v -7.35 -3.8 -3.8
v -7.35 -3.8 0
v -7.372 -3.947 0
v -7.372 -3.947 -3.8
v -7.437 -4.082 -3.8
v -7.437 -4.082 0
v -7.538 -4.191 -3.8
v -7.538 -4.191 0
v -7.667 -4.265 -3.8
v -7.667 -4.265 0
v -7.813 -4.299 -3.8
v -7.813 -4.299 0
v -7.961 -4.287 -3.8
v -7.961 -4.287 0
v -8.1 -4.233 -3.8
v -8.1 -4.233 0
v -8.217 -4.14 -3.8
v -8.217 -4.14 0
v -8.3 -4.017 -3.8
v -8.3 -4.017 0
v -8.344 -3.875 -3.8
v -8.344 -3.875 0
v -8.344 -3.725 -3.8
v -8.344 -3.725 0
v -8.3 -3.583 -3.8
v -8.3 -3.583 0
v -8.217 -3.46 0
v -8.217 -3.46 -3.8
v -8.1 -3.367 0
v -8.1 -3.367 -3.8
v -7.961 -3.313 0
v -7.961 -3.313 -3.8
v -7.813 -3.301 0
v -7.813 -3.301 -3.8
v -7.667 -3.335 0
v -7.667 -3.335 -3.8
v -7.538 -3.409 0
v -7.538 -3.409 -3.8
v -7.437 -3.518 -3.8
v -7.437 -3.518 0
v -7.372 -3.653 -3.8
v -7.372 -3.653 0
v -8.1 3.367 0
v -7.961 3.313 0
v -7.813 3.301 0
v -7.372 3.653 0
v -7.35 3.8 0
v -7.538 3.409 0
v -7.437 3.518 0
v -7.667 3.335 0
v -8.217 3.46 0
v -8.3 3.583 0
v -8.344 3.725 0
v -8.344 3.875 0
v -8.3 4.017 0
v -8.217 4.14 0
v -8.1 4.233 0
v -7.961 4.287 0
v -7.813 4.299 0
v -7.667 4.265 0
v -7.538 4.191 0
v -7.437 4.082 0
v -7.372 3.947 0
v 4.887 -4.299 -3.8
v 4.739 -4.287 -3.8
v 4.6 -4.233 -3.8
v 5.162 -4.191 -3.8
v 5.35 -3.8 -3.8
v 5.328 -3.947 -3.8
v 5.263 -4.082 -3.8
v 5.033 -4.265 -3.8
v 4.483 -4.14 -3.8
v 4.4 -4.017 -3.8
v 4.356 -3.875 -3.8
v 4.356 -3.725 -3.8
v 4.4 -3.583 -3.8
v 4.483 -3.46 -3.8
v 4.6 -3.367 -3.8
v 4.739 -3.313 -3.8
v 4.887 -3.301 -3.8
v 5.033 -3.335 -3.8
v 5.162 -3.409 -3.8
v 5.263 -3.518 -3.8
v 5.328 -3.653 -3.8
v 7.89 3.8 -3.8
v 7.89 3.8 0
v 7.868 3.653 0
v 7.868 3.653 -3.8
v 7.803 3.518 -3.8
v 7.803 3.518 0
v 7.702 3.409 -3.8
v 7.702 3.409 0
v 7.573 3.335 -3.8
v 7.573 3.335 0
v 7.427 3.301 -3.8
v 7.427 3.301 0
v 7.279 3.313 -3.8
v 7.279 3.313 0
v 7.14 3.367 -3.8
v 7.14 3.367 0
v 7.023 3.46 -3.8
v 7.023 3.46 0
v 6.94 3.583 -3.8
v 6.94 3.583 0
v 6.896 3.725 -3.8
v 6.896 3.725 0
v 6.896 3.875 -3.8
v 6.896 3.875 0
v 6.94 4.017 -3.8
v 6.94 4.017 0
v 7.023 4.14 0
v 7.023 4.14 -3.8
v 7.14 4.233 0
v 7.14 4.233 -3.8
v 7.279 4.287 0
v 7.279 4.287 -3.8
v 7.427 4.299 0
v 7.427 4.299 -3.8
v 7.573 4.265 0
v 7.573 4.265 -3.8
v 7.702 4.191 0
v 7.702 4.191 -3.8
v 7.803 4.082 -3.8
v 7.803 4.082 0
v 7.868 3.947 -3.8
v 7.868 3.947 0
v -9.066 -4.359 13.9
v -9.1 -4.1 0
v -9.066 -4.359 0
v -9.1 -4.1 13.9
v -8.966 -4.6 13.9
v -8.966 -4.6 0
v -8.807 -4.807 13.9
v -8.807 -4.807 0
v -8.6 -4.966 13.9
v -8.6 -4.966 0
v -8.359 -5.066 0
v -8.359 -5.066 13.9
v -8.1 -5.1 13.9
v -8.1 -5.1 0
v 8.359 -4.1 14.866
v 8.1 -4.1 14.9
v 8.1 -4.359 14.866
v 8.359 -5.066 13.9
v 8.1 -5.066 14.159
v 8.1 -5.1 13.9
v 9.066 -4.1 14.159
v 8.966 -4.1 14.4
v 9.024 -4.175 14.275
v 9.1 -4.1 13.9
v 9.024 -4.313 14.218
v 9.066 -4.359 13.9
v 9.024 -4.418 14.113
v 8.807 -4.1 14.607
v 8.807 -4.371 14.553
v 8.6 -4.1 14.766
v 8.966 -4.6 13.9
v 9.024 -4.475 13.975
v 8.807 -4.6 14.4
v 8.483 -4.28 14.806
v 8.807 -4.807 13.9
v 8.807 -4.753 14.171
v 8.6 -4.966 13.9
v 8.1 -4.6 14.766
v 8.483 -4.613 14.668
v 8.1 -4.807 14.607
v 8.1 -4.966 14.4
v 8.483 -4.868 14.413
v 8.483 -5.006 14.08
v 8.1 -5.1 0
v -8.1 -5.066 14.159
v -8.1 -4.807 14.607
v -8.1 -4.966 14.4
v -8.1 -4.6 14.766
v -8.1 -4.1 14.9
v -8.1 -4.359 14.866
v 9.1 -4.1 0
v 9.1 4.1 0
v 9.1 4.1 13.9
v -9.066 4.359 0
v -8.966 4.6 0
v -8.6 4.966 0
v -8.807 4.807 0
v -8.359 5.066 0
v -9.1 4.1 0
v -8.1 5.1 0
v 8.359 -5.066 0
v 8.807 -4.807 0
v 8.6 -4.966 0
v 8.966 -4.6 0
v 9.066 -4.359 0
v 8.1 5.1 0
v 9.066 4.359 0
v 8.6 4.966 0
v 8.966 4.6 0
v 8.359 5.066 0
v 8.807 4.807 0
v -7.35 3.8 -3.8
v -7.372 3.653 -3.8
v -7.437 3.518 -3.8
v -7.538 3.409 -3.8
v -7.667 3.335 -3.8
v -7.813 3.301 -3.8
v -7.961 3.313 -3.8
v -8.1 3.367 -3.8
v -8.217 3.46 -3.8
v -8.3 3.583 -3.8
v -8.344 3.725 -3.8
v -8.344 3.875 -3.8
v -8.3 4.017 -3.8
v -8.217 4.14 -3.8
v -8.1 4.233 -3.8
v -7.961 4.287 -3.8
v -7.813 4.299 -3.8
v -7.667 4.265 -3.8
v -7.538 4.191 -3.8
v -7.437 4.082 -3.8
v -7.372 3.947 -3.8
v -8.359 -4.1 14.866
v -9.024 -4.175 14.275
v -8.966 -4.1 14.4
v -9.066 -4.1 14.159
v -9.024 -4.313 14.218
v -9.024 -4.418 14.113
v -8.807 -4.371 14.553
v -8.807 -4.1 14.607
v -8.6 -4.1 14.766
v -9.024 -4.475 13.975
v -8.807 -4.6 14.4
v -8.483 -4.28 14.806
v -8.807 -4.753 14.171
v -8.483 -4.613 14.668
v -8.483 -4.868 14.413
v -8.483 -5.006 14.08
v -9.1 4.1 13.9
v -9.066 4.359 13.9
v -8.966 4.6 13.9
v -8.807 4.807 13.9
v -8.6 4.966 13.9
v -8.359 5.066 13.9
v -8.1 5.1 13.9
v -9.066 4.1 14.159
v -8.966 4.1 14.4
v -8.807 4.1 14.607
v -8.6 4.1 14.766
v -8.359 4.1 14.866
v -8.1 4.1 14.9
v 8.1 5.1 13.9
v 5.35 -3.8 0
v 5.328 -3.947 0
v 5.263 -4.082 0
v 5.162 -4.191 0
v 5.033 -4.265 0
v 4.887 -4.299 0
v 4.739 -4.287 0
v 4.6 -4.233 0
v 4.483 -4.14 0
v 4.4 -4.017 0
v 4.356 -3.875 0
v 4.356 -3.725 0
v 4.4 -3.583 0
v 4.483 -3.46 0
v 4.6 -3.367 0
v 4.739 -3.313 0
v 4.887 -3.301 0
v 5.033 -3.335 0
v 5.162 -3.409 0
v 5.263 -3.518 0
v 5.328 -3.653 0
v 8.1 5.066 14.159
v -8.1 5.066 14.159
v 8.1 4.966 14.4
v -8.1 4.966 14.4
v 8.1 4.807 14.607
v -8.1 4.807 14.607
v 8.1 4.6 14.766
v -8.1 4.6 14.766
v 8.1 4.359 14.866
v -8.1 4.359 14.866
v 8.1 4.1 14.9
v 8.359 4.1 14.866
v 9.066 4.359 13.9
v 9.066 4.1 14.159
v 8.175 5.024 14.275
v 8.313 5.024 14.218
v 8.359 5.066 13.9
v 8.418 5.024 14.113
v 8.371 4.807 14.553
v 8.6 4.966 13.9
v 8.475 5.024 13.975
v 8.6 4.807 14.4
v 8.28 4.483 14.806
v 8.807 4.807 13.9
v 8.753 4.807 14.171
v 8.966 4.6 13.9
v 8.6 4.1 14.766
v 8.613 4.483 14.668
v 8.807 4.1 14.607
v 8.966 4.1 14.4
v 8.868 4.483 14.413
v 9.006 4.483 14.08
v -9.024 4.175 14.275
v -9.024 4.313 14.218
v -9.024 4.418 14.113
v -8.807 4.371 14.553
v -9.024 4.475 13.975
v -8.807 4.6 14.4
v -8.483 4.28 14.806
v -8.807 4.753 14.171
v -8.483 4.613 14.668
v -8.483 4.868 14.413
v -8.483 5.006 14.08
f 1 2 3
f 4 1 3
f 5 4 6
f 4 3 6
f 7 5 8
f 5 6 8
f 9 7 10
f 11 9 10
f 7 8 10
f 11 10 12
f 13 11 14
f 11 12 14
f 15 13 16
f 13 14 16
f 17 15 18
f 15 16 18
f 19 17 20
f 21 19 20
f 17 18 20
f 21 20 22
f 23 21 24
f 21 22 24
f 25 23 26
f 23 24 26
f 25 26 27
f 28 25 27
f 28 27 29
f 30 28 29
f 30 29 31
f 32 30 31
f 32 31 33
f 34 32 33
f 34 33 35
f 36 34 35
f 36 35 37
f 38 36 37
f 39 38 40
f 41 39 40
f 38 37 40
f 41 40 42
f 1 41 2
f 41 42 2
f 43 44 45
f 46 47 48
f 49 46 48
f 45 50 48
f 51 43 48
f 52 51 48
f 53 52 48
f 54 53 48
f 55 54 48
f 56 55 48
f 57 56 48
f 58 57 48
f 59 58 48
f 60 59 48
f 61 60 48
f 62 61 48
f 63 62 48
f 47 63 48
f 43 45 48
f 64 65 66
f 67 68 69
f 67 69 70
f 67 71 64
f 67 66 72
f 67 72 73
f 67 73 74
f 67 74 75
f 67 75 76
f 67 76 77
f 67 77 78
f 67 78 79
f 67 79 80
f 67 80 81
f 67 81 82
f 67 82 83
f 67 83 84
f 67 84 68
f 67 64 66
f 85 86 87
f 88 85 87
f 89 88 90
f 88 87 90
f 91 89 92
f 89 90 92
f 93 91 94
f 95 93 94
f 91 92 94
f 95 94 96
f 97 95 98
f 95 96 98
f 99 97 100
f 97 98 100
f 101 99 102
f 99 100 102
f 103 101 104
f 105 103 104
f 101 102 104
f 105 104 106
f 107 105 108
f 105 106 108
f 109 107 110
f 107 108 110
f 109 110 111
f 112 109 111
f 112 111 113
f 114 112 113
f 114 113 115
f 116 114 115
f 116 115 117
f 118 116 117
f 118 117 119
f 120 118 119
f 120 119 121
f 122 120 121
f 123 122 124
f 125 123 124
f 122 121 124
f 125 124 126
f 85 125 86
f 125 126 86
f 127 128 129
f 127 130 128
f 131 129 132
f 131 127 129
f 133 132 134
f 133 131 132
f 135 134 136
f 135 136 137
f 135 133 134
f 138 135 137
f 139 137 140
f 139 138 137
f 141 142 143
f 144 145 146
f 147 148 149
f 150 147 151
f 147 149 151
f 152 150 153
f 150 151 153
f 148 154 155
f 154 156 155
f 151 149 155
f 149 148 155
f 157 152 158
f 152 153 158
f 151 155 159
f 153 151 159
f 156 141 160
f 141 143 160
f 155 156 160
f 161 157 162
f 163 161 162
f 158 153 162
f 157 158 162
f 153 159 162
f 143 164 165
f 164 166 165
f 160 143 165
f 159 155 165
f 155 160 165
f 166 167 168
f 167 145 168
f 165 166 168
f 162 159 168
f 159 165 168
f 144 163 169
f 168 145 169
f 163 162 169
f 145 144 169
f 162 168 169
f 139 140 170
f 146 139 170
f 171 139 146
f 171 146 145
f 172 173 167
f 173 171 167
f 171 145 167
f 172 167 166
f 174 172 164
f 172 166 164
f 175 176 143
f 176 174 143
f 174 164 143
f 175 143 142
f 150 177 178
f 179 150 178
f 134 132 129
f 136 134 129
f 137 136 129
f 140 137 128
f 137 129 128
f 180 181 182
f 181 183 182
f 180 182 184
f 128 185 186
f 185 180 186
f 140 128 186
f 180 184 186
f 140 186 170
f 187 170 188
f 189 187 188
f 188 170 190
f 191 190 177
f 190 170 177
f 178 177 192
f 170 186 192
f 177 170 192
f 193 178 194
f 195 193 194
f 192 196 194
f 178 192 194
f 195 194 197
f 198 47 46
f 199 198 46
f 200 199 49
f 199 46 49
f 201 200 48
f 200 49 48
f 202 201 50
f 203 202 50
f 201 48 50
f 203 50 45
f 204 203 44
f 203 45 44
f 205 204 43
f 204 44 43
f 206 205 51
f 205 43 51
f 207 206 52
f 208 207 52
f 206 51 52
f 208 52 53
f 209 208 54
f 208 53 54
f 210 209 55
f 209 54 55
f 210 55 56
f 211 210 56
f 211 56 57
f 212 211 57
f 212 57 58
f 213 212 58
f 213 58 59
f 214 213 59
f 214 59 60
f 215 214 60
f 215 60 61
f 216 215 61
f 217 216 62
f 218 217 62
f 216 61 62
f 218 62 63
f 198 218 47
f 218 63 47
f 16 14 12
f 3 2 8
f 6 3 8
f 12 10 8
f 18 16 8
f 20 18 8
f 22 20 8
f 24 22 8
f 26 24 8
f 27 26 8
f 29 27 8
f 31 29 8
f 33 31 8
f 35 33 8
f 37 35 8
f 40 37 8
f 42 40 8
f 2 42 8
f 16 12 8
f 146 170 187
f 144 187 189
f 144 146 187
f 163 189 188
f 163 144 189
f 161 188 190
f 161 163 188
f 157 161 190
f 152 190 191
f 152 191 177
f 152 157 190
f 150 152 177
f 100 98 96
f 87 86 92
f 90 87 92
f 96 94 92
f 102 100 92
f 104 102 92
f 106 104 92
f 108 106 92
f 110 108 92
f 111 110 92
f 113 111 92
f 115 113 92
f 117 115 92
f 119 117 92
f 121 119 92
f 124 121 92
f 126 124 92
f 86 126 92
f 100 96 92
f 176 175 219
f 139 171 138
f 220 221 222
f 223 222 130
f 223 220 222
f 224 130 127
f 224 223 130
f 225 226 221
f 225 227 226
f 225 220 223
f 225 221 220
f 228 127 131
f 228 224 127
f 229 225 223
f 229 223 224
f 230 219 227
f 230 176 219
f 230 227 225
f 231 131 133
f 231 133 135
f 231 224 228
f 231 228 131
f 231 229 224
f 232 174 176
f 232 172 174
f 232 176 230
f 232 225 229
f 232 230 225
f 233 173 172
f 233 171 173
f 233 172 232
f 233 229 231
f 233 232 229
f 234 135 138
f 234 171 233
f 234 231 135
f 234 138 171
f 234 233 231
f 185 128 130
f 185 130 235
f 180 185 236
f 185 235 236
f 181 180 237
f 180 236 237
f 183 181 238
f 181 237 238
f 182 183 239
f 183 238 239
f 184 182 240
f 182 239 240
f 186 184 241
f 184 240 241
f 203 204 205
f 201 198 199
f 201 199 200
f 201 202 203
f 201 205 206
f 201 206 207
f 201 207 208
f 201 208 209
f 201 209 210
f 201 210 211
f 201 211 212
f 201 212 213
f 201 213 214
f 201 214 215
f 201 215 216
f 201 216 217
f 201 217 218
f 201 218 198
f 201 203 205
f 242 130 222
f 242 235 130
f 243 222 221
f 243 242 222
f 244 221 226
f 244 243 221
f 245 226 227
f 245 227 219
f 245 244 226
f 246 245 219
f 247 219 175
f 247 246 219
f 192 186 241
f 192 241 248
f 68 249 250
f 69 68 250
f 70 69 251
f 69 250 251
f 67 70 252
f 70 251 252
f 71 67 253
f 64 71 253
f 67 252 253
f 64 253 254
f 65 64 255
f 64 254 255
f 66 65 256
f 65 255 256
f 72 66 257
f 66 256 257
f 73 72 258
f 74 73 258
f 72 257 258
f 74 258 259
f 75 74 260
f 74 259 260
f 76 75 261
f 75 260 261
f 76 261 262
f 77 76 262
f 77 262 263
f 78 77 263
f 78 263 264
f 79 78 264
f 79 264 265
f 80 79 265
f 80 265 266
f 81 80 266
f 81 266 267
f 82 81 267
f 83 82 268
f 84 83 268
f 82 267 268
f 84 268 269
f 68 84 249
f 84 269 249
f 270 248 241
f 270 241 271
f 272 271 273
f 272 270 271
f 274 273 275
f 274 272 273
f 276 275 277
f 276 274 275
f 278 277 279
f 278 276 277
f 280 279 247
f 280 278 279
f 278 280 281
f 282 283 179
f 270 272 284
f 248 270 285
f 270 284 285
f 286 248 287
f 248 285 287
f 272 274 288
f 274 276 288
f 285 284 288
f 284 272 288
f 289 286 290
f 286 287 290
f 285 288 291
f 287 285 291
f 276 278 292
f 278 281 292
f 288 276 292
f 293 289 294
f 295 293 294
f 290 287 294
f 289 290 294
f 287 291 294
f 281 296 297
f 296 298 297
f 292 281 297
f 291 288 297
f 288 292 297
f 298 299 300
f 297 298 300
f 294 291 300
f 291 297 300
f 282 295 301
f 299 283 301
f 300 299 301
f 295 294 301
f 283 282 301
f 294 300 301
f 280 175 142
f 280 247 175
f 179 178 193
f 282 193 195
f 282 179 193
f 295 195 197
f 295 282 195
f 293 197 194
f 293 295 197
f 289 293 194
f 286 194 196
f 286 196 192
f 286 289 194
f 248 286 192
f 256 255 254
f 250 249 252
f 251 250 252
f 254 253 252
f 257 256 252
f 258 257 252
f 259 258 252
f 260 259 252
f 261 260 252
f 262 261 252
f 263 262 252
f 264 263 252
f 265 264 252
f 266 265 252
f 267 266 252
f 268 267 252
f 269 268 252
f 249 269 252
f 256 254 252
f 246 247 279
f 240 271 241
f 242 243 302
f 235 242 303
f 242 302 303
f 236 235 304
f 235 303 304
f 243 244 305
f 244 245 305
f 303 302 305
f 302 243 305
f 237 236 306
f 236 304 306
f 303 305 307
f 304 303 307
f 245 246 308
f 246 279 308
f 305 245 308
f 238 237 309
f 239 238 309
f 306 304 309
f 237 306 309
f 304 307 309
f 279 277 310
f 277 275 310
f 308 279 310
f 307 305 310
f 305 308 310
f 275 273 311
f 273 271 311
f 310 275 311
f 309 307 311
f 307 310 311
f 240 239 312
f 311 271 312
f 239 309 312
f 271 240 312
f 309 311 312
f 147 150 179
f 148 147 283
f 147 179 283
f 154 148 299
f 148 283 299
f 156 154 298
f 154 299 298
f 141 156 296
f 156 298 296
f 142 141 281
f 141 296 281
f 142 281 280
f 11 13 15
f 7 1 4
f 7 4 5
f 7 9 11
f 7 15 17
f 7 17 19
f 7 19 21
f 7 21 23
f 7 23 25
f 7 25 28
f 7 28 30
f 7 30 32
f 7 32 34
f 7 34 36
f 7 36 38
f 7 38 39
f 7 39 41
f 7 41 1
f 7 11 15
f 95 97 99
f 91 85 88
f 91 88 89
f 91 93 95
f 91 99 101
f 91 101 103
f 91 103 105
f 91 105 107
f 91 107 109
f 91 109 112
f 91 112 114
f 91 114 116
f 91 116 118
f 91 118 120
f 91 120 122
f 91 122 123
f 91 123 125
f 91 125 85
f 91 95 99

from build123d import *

# Parameters (mm, degrees)
F0_W     = 18.2
F0_H     = 10.2
F1_DEPTH = 14.9
F2_R     = 1
F3_R     = 0.5
F4_DEPTH = 3.8


with BuildPart() as f1:
    # F0 (on Top) → F1 (new body)
    with BuildSketch(Plane.XY):
        Rectangle(F0_W, F0_H)
    extrude(amount=F1_DEPTH)

    # F2
    f2_edges = [f1.edges().sort_by_distance(p)[0] for p in [
        (0, -5.1, 14.9),
        (9.1, 0, 14.9),
        (0, 5.1, 14.9),
        (-9.1, 0, 14.9),
        (9.1, -5.1, 7.45),
        (9.1, 5.1, 7.45),
        (-9.1, -5.1, 7.45),
        (-9.1, 5.1, 7.45),
    ]]
    fillet(f2_edges, radius=F2_R)


with BuildPart() as f4:
    # F3 (on face) → F4 (new body)
    with BuildSketch(Plane(origin=(0, 0, 0), x_dir=(1, 0, 0), z_dir=(0, 0, -1))):
        with Locations((-7.85, 3.8)):
            Circle(F3_R)
        with Locations((-7.85, -3.8)):
            Circle(F3_R)
        with Locations((4.85, 3.8)):
            Circle(F3_R)
        with Locations((7.39, -3.8)):
            Circle(F3_R)
    extrude(amount=F4_DEPTH)


solid = Compound([f1.part, f4.part])
